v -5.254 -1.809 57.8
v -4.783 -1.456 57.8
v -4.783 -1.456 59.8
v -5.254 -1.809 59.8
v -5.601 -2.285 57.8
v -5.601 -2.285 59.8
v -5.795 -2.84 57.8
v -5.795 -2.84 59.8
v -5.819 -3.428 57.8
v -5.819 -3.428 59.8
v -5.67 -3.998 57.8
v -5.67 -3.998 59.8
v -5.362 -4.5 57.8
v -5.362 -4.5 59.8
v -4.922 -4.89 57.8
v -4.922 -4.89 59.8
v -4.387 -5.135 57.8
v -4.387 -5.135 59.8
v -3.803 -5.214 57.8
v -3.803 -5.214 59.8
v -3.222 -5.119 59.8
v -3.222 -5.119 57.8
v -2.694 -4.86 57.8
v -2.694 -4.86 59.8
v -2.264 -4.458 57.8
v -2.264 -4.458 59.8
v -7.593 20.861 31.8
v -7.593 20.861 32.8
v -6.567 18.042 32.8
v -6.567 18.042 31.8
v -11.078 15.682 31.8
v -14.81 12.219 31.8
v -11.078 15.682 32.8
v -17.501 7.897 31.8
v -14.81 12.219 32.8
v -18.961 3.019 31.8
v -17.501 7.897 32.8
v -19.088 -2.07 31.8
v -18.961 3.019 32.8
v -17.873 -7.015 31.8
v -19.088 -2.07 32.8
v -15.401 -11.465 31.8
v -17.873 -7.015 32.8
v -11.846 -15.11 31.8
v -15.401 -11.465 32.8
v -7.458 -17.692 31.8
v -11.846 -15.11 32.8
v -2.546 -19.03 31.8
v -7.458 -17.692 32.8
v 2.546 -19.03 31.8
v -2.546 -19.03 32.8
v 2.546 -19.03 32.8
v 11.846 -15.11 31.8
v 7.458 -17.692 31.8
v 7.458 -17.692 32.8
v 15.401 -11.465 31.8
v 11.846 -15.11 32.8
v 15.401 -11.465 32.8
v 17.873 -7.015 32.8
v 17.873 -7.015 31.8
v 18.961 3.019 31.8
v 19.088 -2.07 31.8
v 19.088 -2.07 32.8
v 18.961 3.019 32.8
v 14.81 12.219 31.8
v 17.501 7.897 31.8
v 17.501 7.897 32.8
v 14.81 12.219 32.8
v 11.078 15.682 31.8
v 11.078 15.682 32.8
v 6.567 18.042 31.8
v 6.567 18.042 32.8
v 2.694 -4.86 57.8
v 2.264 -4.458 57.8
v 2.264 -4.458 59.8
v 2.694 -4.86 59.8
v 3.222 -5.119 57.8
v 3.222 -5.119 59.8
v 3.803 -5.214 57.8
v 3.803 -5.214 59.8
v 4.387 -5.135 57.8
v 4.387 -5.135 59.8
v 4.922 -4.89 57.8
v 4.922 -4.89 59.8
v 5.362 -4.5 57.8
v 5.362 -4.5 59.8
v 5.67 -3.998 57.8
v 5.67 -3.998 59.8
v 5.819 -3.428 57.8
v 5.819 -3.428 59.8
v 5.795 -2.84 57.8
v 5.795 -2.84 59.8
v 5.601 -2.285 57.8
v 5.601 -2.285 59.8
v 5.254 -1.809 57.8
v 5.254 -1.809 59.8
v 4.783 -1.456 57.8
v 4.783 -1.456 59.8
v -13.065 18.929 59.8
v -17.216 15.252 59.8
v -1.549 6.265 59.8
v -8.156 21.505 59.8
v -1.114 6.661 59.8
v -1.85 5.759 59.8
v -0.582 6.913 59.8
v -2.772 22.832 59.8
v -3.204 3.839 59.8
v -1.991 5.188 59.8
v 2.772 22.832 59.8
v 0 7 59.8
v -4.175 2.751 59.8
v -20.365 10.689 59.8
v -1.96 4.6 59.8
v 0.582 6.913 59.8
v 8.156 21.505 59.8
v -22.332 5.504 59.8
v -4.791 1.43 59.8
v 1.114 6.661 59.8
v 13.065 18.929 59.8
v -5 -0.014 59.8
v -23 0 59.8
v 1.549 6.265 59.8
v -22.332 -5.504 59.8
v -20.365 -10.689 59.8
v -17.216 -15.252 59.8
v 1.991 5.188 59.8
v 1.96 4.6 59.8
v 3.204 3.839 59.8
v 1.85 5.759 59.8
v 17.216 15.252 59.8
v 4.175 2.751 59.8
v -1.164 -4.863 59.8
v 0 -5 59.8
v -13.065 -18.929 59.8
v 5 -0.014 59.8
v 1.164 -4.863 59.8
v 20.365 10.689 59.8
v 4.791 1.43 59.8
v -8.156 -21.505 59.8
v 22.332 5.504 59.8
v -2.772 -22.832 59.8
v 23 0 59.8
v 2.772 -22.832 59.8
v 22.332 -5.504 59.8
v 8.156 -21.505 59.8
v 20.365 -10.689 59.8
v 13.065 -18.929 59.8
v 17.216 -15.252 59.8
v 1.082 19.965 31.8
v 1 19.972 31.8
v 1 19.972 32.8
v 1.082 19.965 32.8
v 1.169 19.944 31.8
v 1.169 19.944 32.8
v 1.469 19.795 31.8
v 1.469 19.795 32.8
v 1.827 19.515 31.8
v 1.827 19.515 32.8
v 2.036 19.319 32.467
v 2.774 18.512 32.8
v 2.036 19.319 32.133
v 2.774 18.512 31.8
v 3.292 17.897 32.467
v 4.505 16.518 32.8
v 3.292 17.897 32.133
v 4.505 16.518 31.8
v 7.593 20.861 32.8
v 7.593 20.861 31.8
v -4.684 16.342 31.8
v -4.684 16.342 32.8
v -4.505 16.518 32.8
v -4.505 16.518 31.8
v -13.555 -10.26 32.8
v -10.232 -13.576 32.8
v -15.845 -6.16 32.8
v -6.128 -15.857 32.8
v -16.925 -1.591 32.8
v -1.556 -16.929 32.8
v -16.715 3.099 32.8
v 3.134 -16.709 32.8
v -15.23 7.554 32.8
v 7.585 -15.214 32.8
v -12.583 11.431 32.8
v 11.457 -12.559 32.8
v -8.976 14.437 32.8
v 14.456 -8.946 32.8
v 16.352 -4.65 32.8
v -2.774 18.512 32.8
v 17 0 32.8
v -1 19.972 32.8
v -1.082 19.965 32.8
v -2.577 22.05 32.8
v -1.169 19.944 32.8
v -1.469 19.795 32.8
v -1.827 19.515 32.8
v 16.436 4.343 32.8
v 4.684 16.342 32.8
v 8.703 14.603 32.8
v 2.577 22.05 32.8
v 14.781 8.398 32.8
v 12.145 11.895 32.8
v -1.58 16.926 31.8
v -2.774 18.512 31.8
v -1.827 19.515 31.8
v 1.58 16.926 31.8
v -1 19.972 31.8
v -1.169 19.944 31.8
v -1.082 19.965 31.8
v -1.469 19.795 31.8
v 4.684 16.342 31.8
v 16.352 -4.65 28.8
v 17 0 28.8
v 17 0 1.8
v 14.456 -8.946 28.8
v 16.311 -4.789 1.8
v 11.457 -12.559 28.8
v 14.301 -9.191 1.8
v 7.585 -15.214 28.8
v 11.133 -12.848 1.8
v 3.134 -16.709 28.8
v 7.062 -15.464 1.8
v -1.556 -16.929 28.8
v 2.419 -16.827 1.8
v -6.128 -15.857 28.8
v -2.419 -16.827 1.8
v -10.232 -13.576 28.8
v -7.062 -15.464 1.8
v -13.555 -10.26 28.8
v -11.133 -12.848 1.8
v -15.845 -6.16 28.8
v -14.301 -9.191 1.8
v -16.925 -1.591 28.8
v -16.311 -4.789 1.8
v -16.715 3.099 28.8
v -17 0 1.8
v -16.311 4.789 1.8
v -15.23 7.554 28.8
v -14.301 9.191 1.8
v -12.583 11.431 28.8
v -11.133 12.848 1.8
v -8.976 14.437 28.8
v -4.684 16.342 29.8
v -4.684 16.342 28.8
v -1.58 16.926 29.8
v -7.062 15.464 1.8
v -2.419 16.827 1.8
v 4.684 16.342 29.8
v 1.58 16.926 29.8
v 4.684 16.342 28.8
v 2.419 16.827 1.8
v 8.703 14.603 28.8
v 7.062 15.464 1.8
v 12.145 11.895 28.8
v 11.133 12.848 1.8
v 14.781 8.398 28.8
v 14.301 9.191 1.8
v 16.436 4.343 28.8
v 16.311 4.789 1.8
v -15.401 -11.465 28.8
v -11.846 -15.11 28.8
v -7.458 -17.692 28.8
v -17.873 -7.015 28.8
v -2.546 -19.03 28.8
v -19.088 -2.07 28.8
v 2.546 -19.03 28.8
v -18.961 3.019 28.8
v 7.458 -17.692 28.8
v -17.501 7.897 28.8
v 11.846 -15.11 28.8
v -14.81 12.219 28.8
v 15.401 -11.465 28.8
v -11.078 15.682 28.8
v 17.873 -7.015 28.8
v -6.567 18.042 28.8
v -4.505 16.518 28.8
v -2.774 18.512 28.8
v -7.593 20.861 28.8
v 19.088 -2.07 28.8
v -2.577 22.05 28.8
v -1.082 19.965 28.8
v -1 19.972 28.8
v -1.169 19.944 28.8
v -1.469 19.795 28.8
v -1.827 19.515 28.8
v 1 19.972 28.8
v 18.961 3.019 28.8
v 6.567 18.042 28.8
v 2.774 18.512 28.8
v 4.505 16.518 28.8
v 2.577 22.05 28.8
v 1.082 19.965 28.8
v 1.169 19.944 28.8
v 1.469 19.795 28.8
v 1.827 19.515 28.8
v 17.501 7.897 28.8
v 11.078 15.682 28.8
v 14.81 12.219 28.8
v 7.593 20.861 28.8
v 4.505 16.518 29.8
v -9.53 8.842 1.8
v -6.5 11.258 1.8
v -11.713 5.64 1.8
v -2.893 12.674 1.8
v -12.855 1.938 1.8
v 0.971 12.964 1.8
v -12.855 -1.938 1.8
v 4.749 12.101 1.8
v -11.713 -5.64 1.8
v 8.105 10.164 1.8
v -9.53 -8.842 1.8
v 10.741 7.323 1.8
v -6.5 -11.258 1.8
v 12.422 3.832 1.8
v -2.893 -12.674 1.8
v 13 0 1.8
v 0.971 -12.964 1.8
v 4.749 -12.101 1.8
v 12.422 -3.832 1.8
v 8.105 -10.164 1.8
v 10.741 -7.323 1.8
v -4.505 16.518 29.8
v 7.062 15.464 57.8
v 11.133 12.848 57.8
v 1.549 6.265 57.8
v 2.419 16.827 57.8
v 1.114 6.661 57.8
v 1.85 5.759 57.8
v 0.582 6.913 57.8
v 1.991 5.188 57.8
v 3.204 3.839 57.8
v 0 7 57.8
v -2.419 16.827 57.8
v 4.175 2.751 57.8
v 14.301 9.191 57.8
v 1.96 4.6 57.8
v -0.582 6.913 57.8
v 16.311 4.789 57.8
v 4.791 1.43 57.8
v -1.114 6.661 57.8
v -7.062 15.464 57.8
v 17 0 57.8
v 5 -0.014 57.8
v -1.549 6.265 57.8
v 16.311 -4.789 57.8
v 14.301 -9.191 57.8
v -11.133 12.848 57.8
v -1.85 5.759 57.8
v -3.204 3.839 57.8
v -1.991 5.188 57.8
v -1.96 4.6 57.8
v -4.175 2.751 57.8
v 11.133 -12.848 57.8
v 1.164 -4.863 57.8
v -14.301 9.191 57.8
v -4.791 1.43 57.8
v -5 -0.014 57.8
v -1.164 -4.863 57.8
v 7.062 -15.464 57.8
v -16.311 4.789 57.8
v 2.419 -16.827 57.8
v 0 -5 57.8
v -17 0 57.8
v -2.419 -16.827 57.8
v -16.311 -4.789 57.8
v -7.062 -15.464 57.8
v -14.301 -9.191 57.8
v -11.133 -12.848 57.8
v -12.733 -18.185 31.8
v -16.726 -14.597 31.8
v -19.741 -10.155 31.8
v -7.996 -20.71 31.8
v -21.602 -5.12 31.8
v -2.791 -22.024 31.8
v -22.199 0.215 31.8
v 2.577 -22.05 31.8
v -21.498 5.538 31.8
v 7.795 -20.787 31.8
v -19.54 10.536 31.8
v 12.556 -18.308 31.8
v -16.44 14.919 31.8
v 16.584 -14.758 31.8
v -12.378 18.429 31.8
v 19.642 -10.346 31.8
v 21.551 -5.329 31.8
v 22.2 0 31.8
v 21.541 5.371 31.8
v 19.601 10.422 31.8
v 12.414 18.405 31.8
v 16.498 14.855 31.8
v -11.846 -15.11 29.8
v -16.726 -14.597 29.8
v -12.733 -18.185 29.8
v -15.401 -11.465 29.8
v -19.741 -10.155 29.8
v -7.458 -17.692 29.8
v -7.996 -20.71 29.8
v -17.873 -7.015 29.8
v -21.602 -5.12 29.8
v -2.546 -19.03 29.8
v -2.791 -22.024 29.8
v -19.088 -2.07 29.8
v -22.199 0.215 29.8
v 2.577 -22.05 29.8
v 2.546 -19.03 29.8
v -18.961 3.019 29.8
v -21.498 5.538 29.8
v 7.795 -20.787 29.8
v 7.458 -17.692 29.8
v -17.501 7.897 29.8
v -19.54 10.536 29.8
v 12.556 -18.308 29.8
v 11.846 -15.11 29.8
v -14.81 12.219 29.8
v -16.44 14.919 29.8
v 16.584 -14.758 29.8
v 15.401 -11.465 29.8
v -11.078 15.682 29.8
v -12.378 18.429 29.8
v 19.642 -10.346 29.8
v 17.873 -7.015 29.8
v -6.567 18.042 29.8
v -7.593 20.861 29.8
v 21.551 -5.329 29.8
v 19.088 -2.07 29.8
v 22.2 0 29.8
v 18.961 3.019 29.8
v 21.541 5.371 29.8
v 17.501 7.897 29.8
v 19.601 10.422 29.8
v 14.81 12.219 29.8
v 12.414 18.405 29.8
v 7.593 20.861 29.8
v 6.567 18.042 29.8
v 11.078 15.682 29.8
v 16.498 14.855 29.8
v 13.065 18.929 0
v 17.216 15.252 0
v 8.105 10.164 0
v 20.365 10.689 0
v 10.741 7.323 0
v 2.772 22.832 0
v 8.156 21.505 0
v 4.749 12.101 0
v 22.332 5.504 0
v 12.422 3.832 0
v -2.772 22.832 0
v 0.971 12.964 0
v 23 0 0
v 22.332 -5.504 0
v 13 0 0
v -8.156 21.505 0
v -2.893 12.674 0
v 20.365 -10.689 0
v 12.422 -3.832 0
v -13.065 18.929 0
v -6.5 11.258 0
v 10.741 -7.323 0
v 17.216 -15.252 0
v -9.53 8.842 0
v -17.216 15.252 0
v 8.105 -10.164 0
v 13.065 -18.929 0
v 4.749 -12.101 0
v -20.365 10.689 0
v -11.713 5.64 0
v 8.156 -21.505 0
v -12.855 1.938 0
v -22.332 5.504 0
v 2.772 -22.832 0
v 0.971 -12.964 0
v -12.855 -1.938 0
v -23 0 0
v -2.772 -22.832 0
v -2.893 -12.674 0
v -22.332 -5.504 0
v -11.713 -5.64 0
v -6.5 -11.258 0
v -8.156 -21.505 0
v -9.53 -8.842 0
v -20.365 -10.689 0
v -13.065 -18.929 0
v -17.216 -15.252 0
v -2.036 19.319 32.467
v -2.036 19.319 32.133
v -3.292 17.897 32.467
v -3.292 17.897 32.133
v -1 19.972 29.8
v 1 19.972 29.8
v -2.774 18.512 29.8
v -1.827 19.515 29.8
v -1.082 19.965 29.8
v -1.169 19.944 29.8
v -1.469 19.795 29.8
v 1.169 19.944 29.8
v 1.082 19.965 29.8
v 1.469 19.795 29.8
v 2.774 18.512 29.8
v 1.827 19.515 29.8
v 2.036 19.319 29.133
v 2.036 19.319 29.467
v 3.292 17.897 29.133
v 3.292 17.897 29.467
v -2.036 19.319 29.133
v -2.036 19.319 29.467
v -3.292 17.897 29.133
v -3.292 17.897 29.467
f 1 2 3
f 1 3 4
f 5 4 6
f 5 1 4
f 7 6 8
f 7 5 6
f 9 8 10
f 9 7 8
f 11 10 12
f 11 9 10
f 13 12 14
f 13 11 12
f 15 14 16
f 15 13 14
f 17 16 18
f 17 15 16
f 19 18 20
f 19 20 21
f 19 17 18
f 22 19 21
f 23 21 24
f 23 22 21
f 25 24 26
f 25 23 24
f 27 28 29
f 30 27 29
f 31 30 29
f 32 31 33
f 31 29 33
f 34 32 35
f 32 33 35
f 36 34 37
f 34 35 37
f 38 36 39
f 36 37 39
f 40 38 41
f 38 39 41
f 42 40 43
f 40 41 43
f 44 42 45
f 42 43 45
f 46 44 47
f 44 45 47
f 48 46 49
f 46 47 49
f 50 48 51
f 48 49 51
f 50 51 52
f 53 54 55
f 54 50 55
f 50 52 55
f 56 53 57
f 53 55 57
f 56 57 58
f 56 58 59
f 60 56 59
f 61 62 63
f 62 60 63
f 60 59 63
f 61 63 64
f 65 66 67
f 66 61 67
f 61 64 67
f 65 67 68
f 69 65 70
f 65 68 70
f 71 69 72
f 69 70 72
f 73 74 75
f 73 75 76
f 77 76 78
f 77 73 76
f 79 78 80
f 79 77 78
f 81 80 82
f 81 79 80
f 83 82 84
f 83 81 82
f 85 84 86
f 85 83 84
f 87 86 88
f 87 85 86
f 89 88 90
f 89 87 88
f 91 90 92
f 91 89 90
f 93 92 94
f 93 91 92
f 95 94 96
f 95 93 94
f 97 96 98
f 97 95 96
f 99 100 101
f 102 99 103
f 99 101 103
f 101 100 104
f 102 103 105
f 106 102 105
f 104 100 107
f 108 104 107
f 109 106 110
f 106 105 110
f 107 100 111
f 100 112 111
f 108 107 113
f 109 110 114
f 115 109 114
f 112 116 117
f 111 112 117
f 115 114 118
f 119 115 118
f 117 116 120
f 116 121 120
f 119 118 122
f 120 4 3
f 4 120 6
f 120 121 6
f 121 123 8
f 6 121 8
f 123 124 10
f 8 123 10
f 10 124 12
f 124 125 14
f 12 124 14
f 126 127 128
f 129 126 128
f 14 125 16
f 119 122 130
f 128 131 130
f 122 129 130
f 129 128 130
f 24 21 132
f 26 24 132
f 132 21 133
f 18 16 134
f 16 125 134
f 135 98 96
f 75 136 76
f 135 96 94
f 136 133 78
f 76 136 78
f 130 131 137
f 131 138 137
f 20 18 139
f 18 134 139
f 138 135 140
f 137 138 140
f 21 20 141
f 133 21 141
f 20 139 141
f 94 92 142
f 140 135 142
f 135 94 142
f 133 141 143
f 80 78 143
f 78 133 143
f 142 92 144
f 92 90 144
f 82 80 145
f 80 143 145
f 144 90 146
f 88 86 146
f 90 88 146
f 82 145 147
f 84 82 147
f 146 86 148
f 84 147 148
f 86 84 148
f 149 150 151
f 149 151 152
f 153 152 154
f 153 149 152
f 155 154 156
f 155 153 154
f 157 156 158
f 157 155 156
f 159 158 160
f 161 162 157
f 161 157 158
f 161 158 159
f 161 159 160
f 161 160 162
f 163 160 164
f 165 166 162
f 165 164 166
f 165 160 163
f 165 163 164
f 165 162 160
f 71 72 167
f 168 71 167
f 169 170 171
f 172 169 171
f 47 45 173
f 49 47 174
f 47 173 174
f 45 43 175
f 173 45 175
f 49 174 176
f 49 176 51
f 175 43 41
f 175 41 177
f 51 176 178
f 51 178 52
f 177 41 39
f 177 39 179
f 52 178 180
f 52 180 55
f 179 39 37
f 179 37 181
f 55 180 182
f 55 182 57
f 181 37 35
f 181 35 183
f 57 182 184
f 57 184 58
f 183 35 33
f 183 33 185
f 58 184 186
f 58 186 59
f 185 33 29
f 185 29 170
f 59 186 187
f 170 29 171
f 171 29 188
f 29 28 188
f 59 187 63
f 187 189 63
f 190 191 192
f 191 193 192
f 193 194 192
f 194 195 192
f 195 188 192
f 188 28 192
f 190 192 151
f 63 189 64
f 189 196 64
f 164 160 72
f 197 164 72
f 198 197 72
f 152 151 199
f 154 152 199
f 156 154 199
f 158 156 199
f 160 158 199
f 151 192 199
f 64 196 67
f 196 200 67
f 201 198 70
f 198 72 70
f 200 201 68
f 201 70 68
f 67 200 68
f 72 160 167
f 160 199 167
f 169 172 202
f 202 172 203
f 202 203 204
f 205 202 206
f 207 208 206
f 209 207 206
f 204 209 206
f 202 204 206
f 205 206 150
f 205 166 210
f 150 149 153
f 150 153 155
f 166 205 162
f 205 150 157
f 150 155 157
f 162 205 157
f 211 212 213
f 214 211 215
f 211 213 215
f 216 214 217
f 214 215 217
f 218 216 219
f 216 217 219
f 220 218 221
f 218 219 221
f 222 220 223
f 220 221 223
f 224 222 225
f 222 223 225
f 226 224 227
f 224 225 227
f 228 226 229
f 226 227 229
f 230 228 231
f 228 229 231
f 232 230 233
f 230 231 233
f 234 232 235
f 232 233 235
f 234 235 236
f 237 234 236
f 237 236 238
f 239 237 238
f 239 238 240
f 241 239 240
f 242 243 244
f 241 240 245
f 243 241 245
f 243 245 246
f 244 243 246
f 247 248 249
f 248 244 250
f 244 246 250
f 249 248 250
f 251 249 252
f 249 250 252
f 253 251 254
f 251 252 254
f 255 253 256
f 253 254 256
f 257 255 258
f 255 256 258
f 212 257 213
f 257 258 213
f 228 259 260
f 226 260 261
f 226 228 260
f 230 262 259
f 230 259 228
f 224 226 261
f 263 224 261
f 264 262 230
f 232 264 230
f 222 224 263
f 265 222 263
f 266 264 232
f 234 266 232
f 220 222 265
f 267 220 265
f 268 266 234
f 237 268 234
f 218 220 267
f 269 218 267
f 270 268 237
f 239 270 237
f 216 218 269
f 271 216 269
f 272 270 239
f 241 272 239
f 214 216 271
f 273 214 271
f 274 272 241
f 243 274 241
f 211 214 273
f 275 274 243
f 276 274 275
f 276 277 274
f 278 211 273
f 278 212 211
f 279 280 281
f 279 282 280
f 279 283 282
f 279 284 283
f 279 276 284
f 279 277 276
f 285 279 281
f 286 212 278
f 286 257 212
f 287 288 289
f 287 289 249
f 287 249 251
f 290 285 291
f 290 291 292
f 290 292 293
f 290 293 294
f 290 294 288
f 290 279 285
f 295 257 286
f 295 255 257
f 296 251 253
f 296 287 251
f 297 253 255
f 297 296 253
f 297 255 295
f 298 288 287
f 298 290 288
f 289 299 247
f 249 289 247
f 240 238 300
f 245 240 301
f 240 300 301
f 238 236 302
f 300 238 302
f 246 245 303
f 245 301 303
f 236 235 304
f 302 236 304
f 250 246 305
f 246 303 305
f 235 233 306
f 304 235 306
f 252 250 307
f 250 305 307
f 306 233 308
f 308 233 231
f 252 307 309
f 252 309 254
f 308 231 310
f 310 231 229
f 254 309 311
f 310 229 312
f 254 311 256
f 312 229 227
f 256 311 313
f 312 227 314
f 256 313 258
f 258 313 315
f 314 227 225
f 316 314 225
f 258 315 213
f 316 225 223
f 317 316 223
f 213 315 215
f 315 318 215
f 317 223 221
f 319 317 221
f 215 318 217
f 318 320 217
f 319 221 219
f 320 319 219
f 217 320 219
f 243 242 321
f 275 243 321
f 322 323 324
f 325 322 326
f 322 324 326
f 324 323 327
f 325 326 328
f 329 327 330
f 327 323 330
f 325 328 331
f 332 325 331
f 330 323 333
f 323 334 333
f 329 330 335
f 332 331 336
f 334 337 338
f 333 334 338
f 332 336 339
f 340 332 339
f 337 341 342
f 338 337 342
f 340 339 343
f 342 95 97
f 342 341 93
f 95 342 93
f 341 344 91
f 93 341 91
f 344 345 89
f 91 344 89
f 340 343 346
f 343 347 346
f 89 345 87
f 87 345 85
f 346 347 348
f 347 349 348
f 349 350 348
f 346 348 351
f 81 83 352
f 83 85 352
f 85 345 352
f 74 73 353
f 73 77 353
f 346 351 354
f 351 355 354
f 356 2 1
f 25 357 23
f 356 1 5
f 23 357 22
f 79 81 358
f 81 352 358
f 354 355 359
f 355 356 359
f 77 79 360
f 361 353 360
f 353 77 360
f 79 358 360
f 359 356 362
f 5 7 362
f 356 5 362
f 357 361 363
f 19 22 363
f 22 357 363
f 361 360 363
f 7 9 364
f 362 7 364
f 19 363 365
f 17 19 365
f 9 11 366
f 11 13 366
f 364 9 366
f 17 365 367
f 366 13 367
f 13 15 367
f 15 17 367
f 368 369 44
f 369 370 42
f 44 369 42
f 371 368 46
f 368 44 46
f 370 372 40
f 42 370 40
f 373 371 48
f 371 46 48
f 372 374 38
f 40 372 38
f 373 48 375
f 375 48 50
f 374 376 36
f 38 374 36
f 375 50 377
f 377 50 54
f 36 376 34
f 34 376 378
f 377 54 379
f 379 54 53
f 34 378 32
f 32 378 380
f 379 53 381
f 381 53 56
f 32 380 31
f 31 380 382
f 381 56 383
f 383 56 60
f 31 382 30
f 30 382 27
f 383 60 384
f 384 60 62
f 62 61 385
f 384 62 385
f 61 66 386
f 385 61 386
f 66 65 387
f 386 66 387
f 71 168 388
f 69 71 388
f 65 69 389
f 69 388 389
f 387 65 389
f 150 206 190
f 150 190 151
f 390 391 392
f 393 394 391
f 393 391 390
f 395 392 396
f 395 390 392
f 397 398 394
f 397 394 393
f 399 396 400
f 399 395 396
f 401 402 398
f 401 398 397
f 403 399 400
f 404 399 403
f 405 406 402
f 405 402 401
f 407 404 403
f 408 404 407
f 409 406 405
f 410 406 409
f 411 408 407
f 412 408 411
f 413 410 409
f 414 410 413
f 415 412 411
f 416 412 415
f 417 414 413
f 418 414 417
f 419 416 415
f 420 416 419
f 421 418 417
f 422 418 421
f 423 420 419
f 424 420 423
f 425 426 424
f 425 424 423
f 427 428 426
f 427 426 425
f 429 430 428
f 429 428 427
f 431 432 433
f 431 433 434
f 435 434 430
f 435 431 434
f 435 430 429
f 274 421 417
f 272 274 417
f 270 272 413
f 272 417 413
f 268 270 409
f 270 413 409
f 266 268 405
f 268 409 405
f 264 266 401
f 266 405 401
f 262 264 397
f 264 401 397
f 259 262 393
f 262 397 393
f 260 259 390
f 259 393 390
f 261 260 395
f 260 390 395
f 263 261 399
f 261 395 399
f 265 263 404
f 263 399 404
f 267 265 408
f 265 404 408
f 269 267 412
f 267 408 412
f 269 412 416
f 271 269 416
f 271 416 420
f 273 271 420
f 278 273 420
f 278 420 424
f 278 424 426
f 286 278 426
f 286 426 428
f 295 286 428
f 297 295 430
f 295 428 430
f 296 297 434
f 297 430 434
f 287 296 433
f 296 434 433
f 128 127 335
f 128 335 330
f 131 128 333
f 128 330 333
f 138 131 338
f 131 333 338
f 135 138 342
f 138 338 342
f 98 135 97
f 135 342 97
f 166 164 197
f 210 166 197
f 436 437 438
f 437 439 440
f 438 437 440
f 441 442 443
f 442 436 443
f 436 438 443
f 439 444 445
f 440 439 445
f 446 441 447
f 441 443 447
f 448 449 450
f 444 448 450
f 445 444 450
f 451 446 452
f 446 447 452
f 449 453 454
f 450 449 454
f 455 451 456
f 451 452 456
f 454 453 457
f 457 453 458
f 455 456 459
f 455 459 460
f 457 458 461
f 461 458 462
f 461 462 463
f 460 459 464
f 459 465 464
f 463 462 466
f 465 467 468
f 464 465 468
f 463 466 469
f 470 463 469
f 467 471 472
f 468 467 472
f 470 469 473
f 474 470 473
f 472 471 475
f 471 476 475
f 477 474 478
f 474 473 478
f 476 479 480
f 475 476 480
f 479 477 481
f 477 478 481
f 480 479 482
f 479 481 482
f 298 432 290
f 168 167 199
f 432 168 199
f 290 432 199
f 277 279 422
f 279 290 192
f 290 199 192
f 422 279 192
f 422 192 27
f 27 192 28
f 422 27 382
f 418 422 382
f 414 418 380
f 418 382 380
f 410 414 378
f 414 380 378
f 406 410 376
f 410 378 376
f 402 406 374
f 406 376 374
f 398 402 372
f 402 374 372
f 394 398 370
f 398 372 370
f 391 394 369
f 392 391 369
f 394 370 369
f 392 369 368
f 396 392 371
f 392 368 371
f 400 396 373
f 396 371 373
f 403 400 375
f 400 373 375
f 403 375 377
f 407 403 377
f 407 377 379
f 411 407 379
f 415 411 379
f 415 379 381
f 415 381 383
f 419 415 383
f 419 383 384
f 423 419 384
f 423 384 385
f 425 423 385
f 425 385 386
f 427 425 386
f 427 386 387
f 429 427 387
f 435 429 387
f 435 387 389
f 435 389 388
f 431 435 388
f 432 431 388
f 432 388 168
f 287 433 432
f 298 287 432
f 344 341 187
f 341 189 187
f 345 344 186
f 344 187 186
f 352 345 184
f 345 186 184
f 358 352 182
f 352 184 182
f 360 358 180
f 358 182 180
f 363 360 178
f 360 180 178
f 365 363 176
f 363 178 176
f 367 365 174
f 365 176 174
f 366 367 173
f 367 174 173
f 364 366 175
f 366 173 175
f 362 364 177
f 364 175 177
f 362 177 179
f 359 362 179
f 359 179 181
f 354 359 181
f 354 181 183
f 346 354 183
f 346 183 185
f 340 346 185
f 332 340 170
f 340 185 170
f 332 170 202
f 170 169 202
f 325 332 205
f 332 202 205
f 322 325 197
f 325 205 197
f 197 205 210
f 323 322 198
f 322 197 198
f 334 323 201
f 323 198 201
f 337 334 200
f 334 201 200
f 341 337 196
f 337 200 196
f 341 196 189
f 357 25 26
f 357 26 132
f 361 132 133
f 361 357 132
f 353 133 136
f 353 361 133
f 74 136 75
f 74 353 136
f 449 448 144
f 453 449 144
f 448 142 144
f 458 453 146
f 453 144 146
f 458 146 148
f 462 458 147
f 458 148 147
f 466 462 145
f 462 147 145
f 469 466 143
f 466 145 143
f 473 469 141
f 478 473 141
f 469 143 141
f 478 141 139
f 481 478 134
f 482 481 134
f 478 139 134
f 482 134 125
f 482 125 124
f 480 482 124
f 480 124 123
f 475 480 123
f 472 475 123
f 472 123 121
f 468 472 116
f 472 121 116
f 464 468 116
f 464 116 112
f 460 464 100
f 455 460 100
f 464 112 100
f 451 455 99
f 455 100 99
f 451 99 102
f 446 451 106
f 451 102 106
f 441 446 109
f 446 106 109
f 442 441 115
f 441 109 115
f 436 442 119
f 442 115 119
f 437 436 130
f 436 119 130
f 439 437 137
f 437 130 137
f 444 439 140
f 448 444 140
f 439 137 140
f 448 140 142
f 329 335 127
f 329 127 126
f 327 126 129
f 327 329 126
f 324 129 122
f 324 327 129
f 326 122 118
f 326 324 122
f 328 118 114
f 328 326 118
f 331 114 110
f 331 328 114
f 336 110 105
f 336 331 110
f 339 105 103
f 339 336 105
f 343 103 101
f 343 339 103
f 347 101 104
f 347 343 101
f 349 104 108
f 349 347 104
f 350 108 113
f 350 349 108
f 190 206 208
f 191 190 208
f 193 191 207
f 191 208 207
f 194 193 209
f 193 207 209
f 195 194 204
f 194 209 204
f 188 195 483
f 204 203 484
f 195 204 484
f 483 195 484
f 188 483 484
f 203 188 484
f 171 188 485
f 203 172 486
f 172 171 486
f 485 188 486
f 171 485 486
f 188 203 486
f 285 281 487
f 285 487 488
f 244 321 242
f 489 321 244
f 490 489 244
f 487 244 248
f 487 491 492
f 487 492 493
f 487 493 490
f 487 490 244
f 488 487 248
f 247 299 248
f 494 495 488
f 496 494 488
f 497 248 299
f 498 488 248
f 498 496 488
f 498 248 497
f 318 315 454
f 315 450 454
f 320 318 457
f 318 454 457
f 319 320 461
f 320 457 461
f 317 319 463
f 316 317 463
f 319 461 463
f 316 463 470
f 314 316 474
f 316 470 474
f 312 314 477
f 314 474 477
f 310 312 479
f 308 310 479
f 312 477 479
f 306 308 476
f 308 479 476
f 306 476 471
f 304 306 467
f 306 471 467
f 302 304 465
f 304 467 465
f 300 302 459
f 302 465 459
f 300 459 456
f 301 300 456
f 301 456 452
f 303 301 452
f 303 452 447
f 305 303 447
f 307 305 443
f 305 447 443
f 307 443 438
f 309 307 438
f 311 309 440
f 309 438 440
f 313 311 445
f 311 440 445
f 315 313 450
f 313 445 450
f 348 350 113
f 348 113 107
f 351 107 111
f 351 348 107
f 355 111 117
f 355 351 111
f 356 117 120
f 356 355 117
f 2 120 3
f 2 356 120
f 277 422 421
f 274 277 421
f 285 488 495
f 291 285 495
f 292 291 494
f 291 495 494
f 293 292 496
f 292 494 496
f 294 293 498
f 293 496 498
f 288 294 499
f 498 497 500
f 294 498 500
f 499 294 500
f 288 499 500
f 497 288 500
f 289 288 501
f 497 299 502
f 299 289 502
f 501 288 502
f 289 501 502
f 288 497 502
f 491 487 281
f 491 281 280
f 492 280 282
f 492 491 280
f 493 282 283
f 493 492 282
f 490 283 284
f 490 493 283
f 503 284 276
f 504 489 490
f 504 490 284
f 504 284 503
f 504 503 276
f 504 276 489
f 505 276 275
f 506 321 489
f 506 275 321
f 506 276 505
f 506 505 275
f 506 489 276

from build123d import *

# Parameters (mm, degrees)
CUT_EXTRUDE1_DEPTH = 2
CUT_EXTRUDE2_DEPTH = 1
CUT_EXTRUDE3_REACH = 70.074


with BuildPart() as part:
    # Sketch1 → Revolve1 (revolve)
    with BuildSketch(Plane(origin=(0, 0, 0), x_dir=(0, 0, -1), z_dir=(1, 0, 0))):
        Polygon((-59.8, 5), (-57.8, 5), (-57.8, 17), (-1.8, 17), (-1.8, 13), (0, 13), (0, 23), (-59.8, 23), align=None)
    revolve(axis=Axis((0, 0, 1072.381477522), (0, 0, -1)))

    # Sketch3 → Cut-Extrude1 (cut, symmetric)
    with BuildSketch(Plane.XY.offset(30.8)):
        with BuildLine():
            ThreePointArc((-6.566786752, 18.042098319), (0, -19.2), (6.566786752, 18.042098319))
            Line((6.566786752, 18.042098319), (7.592847182, 20.861176181))
            ThreePointArc((7.592847182, 20.861176181), (0, 22.2), (-7.592847182, 20.861176181))
            Line((-7.592847182, 20.861176181), (-6.566786752, 18.042098319))
        make_face()
        with BuildLine():
            add(Edge.make_bspline(
                [(-1, 19.972224976), (-1.837517439, 19.972224976), (-3.400688885, 17.606551444), (-4.505268868, 16.51808236)],
                knots=[0, 0, 0, 0, 1, 1, 1, 1], degree=3))
            Line((-1, 19.972224976), (1, 19.972224976))
            add(Edge.make_bspline(
                [(1, 19.972224976), (1.837517439, 19.972224976), (3.400688885, 17.606551444), (4.505268868, 16.51808236)],
                knots=[0, 0, 0, 0, 1, 1, 1, 1], degree=3))
            Line((4.505268868, 16.51808236), (4.683975969, 16.341981799))
            ThreePointArc((4.683975969, 16.341981799), (13.576221703, 10.231627645), (17, 0))
            ThreePointArc((17, 0), (-10.231627645, -13.576221703), (-4.683975969, 16.341981799))
            Line((-4.683975969, 16.341981799), (-4.505268868, 16.51808236))
        make_face(mode=Mode.SUBTRACT)
    extrude(amount=CUT_EXTRUDE1_DEPTH, both=True, mode=Mode.SUBTRACT)

    # Sketch3<5> → Cut-Extrude2 (cut, symmetric)
    with BuildSketch(Plane.XY.offset(30.8)):
        with BuildLine():
            Line((1, 19.972224976), (-1, 19.972224976))
            add(Edge.make_bspline(
                [(-1, 19.972224976), (-1.837517439, 19.972224976), (-3.400688885, 17.606551444), (-4.505268868, 16.51808236)],
                knots=[0, 0, 0, 0, 1, 1, 1, 1], degree=3))
            Line((-4.505268868, 16.51808236), (-4.683975969, 16.341981799))
            ThreePointArc((-4.683975969, 16.341981799), (0, -17), (4.683975969, 16.341981799))
            Line((4.683975969, 16.341981799), (4.505268868, 16.51808236))
            add(Edge.make_bspline(
                [(1, 19.972224976), (1.837517439, 19.972224976), (3.400688885, 17.606551444), (4.505268868, 16.51808236)],
                knots=[0, 0, 0, 0, 1, 1, 1, 1], degree=3))
        make_face()
        with BuildLine():
            Line((7.592847182, 20.861176181), (6.566786752, 18.042098319))
            ThreePointArc((6.566786752, 18.042098319), (0, -19.2), (-6.566786752, 18.042098319))
            Line((-6.566786752, 18.042098319), (-7.592847182, 20.861176181))
            ThreePointArc((-7.592847182, 20.861176181), (0, -22.2), (7.592847182, 20.861176181))
        make_face()
    extrude(amount=CUT_EXTRUDE2_DEPTH, both=True, mode=Mode.SUBTRACT)

    # Sketch5 → Cut-Extrude3 (cut, up to next)
    with BuildSketch(Plane.XY.offset(59.8), mode=Mode.PRIVATE) as cut_extrude3_sk1:
        with BuildLine():
            ThreePointArc((1.959591794, 4.6), (0, 7), (-1.959591794, 4.6))
            ThreePointArc((-1.959591794, 4.6), (0, 5), (1.959591794, 4.6))
        make_face()
    cut_extrude3_tool1 = extrude(cut_extrude3_sk1.sketch, amount=-CUT_EXTRUDE3_REACH, mode=Mode.PRIVATE) & part.part
    # Sketch5 → Cut-Extrude3 (cut, up to next)
    with BuildSketch(Plane.XY.offset(59.8), mode=Mode.PRIVATE) as cut_extrude3_sk2:
        with BuildLine():
            ThreePointArc((-2.264203113, -4.457957409), (-3.830222216, -3.213938048), (-4.783405764, -1.4556886))
            ThreePointArc((-4.783405764, -1.4556886), (-5.362311102, -4.499513268), (-2.264203113, -4.457957409))
        make_face()
    cut_extrude3_tool2 = extrude(cut_extrude3_sk2.sketch, amount=-CUT_EXTRUDE3_REACH, mode=Mode.PRIVATE) & part.part
    # Sketch5 → Cut-Extrude3 (cut, up to next)
    with BuildSketch(Plane.XY.offset(59.8), mode=Mode.PRIVATE) as cut_extrude3_sk3:
        with BuildLine():
            ThreePointArc((2.264203113, -4.457957409), (5.362311102, -4.499513268), (4.783405764, -1.4556886))
            ThreePointArc((4.783405764, -1.4556886), (3.830222216, -3.213938048), (2.264203113, -4.457957409))
        make_face()
    cut_extrude3_tool3 = extrude(cut_extrude3_sk3.sketch, amount=-CUT_EXTRUDE3_REACH, mode=Mode.PRIVATE) & part.part
    add(cut_extrude3_tool1.solids().sort_by_distance((0, 5.772711, 59.8))[0], mode=Mode.SUBTRACT)
    add(cut_extrude3_tool2.solids().sort_by_distance((-4.422153, -3.710627, 59.8))[0], mode=Mode.SUBTRACT)
    add(cut_extrude3_tool3.solids().sort_by_distance((4.422153, -3.710627, 59.8))[0], mode=Mode.SUBTRACT)


solid = part.part
